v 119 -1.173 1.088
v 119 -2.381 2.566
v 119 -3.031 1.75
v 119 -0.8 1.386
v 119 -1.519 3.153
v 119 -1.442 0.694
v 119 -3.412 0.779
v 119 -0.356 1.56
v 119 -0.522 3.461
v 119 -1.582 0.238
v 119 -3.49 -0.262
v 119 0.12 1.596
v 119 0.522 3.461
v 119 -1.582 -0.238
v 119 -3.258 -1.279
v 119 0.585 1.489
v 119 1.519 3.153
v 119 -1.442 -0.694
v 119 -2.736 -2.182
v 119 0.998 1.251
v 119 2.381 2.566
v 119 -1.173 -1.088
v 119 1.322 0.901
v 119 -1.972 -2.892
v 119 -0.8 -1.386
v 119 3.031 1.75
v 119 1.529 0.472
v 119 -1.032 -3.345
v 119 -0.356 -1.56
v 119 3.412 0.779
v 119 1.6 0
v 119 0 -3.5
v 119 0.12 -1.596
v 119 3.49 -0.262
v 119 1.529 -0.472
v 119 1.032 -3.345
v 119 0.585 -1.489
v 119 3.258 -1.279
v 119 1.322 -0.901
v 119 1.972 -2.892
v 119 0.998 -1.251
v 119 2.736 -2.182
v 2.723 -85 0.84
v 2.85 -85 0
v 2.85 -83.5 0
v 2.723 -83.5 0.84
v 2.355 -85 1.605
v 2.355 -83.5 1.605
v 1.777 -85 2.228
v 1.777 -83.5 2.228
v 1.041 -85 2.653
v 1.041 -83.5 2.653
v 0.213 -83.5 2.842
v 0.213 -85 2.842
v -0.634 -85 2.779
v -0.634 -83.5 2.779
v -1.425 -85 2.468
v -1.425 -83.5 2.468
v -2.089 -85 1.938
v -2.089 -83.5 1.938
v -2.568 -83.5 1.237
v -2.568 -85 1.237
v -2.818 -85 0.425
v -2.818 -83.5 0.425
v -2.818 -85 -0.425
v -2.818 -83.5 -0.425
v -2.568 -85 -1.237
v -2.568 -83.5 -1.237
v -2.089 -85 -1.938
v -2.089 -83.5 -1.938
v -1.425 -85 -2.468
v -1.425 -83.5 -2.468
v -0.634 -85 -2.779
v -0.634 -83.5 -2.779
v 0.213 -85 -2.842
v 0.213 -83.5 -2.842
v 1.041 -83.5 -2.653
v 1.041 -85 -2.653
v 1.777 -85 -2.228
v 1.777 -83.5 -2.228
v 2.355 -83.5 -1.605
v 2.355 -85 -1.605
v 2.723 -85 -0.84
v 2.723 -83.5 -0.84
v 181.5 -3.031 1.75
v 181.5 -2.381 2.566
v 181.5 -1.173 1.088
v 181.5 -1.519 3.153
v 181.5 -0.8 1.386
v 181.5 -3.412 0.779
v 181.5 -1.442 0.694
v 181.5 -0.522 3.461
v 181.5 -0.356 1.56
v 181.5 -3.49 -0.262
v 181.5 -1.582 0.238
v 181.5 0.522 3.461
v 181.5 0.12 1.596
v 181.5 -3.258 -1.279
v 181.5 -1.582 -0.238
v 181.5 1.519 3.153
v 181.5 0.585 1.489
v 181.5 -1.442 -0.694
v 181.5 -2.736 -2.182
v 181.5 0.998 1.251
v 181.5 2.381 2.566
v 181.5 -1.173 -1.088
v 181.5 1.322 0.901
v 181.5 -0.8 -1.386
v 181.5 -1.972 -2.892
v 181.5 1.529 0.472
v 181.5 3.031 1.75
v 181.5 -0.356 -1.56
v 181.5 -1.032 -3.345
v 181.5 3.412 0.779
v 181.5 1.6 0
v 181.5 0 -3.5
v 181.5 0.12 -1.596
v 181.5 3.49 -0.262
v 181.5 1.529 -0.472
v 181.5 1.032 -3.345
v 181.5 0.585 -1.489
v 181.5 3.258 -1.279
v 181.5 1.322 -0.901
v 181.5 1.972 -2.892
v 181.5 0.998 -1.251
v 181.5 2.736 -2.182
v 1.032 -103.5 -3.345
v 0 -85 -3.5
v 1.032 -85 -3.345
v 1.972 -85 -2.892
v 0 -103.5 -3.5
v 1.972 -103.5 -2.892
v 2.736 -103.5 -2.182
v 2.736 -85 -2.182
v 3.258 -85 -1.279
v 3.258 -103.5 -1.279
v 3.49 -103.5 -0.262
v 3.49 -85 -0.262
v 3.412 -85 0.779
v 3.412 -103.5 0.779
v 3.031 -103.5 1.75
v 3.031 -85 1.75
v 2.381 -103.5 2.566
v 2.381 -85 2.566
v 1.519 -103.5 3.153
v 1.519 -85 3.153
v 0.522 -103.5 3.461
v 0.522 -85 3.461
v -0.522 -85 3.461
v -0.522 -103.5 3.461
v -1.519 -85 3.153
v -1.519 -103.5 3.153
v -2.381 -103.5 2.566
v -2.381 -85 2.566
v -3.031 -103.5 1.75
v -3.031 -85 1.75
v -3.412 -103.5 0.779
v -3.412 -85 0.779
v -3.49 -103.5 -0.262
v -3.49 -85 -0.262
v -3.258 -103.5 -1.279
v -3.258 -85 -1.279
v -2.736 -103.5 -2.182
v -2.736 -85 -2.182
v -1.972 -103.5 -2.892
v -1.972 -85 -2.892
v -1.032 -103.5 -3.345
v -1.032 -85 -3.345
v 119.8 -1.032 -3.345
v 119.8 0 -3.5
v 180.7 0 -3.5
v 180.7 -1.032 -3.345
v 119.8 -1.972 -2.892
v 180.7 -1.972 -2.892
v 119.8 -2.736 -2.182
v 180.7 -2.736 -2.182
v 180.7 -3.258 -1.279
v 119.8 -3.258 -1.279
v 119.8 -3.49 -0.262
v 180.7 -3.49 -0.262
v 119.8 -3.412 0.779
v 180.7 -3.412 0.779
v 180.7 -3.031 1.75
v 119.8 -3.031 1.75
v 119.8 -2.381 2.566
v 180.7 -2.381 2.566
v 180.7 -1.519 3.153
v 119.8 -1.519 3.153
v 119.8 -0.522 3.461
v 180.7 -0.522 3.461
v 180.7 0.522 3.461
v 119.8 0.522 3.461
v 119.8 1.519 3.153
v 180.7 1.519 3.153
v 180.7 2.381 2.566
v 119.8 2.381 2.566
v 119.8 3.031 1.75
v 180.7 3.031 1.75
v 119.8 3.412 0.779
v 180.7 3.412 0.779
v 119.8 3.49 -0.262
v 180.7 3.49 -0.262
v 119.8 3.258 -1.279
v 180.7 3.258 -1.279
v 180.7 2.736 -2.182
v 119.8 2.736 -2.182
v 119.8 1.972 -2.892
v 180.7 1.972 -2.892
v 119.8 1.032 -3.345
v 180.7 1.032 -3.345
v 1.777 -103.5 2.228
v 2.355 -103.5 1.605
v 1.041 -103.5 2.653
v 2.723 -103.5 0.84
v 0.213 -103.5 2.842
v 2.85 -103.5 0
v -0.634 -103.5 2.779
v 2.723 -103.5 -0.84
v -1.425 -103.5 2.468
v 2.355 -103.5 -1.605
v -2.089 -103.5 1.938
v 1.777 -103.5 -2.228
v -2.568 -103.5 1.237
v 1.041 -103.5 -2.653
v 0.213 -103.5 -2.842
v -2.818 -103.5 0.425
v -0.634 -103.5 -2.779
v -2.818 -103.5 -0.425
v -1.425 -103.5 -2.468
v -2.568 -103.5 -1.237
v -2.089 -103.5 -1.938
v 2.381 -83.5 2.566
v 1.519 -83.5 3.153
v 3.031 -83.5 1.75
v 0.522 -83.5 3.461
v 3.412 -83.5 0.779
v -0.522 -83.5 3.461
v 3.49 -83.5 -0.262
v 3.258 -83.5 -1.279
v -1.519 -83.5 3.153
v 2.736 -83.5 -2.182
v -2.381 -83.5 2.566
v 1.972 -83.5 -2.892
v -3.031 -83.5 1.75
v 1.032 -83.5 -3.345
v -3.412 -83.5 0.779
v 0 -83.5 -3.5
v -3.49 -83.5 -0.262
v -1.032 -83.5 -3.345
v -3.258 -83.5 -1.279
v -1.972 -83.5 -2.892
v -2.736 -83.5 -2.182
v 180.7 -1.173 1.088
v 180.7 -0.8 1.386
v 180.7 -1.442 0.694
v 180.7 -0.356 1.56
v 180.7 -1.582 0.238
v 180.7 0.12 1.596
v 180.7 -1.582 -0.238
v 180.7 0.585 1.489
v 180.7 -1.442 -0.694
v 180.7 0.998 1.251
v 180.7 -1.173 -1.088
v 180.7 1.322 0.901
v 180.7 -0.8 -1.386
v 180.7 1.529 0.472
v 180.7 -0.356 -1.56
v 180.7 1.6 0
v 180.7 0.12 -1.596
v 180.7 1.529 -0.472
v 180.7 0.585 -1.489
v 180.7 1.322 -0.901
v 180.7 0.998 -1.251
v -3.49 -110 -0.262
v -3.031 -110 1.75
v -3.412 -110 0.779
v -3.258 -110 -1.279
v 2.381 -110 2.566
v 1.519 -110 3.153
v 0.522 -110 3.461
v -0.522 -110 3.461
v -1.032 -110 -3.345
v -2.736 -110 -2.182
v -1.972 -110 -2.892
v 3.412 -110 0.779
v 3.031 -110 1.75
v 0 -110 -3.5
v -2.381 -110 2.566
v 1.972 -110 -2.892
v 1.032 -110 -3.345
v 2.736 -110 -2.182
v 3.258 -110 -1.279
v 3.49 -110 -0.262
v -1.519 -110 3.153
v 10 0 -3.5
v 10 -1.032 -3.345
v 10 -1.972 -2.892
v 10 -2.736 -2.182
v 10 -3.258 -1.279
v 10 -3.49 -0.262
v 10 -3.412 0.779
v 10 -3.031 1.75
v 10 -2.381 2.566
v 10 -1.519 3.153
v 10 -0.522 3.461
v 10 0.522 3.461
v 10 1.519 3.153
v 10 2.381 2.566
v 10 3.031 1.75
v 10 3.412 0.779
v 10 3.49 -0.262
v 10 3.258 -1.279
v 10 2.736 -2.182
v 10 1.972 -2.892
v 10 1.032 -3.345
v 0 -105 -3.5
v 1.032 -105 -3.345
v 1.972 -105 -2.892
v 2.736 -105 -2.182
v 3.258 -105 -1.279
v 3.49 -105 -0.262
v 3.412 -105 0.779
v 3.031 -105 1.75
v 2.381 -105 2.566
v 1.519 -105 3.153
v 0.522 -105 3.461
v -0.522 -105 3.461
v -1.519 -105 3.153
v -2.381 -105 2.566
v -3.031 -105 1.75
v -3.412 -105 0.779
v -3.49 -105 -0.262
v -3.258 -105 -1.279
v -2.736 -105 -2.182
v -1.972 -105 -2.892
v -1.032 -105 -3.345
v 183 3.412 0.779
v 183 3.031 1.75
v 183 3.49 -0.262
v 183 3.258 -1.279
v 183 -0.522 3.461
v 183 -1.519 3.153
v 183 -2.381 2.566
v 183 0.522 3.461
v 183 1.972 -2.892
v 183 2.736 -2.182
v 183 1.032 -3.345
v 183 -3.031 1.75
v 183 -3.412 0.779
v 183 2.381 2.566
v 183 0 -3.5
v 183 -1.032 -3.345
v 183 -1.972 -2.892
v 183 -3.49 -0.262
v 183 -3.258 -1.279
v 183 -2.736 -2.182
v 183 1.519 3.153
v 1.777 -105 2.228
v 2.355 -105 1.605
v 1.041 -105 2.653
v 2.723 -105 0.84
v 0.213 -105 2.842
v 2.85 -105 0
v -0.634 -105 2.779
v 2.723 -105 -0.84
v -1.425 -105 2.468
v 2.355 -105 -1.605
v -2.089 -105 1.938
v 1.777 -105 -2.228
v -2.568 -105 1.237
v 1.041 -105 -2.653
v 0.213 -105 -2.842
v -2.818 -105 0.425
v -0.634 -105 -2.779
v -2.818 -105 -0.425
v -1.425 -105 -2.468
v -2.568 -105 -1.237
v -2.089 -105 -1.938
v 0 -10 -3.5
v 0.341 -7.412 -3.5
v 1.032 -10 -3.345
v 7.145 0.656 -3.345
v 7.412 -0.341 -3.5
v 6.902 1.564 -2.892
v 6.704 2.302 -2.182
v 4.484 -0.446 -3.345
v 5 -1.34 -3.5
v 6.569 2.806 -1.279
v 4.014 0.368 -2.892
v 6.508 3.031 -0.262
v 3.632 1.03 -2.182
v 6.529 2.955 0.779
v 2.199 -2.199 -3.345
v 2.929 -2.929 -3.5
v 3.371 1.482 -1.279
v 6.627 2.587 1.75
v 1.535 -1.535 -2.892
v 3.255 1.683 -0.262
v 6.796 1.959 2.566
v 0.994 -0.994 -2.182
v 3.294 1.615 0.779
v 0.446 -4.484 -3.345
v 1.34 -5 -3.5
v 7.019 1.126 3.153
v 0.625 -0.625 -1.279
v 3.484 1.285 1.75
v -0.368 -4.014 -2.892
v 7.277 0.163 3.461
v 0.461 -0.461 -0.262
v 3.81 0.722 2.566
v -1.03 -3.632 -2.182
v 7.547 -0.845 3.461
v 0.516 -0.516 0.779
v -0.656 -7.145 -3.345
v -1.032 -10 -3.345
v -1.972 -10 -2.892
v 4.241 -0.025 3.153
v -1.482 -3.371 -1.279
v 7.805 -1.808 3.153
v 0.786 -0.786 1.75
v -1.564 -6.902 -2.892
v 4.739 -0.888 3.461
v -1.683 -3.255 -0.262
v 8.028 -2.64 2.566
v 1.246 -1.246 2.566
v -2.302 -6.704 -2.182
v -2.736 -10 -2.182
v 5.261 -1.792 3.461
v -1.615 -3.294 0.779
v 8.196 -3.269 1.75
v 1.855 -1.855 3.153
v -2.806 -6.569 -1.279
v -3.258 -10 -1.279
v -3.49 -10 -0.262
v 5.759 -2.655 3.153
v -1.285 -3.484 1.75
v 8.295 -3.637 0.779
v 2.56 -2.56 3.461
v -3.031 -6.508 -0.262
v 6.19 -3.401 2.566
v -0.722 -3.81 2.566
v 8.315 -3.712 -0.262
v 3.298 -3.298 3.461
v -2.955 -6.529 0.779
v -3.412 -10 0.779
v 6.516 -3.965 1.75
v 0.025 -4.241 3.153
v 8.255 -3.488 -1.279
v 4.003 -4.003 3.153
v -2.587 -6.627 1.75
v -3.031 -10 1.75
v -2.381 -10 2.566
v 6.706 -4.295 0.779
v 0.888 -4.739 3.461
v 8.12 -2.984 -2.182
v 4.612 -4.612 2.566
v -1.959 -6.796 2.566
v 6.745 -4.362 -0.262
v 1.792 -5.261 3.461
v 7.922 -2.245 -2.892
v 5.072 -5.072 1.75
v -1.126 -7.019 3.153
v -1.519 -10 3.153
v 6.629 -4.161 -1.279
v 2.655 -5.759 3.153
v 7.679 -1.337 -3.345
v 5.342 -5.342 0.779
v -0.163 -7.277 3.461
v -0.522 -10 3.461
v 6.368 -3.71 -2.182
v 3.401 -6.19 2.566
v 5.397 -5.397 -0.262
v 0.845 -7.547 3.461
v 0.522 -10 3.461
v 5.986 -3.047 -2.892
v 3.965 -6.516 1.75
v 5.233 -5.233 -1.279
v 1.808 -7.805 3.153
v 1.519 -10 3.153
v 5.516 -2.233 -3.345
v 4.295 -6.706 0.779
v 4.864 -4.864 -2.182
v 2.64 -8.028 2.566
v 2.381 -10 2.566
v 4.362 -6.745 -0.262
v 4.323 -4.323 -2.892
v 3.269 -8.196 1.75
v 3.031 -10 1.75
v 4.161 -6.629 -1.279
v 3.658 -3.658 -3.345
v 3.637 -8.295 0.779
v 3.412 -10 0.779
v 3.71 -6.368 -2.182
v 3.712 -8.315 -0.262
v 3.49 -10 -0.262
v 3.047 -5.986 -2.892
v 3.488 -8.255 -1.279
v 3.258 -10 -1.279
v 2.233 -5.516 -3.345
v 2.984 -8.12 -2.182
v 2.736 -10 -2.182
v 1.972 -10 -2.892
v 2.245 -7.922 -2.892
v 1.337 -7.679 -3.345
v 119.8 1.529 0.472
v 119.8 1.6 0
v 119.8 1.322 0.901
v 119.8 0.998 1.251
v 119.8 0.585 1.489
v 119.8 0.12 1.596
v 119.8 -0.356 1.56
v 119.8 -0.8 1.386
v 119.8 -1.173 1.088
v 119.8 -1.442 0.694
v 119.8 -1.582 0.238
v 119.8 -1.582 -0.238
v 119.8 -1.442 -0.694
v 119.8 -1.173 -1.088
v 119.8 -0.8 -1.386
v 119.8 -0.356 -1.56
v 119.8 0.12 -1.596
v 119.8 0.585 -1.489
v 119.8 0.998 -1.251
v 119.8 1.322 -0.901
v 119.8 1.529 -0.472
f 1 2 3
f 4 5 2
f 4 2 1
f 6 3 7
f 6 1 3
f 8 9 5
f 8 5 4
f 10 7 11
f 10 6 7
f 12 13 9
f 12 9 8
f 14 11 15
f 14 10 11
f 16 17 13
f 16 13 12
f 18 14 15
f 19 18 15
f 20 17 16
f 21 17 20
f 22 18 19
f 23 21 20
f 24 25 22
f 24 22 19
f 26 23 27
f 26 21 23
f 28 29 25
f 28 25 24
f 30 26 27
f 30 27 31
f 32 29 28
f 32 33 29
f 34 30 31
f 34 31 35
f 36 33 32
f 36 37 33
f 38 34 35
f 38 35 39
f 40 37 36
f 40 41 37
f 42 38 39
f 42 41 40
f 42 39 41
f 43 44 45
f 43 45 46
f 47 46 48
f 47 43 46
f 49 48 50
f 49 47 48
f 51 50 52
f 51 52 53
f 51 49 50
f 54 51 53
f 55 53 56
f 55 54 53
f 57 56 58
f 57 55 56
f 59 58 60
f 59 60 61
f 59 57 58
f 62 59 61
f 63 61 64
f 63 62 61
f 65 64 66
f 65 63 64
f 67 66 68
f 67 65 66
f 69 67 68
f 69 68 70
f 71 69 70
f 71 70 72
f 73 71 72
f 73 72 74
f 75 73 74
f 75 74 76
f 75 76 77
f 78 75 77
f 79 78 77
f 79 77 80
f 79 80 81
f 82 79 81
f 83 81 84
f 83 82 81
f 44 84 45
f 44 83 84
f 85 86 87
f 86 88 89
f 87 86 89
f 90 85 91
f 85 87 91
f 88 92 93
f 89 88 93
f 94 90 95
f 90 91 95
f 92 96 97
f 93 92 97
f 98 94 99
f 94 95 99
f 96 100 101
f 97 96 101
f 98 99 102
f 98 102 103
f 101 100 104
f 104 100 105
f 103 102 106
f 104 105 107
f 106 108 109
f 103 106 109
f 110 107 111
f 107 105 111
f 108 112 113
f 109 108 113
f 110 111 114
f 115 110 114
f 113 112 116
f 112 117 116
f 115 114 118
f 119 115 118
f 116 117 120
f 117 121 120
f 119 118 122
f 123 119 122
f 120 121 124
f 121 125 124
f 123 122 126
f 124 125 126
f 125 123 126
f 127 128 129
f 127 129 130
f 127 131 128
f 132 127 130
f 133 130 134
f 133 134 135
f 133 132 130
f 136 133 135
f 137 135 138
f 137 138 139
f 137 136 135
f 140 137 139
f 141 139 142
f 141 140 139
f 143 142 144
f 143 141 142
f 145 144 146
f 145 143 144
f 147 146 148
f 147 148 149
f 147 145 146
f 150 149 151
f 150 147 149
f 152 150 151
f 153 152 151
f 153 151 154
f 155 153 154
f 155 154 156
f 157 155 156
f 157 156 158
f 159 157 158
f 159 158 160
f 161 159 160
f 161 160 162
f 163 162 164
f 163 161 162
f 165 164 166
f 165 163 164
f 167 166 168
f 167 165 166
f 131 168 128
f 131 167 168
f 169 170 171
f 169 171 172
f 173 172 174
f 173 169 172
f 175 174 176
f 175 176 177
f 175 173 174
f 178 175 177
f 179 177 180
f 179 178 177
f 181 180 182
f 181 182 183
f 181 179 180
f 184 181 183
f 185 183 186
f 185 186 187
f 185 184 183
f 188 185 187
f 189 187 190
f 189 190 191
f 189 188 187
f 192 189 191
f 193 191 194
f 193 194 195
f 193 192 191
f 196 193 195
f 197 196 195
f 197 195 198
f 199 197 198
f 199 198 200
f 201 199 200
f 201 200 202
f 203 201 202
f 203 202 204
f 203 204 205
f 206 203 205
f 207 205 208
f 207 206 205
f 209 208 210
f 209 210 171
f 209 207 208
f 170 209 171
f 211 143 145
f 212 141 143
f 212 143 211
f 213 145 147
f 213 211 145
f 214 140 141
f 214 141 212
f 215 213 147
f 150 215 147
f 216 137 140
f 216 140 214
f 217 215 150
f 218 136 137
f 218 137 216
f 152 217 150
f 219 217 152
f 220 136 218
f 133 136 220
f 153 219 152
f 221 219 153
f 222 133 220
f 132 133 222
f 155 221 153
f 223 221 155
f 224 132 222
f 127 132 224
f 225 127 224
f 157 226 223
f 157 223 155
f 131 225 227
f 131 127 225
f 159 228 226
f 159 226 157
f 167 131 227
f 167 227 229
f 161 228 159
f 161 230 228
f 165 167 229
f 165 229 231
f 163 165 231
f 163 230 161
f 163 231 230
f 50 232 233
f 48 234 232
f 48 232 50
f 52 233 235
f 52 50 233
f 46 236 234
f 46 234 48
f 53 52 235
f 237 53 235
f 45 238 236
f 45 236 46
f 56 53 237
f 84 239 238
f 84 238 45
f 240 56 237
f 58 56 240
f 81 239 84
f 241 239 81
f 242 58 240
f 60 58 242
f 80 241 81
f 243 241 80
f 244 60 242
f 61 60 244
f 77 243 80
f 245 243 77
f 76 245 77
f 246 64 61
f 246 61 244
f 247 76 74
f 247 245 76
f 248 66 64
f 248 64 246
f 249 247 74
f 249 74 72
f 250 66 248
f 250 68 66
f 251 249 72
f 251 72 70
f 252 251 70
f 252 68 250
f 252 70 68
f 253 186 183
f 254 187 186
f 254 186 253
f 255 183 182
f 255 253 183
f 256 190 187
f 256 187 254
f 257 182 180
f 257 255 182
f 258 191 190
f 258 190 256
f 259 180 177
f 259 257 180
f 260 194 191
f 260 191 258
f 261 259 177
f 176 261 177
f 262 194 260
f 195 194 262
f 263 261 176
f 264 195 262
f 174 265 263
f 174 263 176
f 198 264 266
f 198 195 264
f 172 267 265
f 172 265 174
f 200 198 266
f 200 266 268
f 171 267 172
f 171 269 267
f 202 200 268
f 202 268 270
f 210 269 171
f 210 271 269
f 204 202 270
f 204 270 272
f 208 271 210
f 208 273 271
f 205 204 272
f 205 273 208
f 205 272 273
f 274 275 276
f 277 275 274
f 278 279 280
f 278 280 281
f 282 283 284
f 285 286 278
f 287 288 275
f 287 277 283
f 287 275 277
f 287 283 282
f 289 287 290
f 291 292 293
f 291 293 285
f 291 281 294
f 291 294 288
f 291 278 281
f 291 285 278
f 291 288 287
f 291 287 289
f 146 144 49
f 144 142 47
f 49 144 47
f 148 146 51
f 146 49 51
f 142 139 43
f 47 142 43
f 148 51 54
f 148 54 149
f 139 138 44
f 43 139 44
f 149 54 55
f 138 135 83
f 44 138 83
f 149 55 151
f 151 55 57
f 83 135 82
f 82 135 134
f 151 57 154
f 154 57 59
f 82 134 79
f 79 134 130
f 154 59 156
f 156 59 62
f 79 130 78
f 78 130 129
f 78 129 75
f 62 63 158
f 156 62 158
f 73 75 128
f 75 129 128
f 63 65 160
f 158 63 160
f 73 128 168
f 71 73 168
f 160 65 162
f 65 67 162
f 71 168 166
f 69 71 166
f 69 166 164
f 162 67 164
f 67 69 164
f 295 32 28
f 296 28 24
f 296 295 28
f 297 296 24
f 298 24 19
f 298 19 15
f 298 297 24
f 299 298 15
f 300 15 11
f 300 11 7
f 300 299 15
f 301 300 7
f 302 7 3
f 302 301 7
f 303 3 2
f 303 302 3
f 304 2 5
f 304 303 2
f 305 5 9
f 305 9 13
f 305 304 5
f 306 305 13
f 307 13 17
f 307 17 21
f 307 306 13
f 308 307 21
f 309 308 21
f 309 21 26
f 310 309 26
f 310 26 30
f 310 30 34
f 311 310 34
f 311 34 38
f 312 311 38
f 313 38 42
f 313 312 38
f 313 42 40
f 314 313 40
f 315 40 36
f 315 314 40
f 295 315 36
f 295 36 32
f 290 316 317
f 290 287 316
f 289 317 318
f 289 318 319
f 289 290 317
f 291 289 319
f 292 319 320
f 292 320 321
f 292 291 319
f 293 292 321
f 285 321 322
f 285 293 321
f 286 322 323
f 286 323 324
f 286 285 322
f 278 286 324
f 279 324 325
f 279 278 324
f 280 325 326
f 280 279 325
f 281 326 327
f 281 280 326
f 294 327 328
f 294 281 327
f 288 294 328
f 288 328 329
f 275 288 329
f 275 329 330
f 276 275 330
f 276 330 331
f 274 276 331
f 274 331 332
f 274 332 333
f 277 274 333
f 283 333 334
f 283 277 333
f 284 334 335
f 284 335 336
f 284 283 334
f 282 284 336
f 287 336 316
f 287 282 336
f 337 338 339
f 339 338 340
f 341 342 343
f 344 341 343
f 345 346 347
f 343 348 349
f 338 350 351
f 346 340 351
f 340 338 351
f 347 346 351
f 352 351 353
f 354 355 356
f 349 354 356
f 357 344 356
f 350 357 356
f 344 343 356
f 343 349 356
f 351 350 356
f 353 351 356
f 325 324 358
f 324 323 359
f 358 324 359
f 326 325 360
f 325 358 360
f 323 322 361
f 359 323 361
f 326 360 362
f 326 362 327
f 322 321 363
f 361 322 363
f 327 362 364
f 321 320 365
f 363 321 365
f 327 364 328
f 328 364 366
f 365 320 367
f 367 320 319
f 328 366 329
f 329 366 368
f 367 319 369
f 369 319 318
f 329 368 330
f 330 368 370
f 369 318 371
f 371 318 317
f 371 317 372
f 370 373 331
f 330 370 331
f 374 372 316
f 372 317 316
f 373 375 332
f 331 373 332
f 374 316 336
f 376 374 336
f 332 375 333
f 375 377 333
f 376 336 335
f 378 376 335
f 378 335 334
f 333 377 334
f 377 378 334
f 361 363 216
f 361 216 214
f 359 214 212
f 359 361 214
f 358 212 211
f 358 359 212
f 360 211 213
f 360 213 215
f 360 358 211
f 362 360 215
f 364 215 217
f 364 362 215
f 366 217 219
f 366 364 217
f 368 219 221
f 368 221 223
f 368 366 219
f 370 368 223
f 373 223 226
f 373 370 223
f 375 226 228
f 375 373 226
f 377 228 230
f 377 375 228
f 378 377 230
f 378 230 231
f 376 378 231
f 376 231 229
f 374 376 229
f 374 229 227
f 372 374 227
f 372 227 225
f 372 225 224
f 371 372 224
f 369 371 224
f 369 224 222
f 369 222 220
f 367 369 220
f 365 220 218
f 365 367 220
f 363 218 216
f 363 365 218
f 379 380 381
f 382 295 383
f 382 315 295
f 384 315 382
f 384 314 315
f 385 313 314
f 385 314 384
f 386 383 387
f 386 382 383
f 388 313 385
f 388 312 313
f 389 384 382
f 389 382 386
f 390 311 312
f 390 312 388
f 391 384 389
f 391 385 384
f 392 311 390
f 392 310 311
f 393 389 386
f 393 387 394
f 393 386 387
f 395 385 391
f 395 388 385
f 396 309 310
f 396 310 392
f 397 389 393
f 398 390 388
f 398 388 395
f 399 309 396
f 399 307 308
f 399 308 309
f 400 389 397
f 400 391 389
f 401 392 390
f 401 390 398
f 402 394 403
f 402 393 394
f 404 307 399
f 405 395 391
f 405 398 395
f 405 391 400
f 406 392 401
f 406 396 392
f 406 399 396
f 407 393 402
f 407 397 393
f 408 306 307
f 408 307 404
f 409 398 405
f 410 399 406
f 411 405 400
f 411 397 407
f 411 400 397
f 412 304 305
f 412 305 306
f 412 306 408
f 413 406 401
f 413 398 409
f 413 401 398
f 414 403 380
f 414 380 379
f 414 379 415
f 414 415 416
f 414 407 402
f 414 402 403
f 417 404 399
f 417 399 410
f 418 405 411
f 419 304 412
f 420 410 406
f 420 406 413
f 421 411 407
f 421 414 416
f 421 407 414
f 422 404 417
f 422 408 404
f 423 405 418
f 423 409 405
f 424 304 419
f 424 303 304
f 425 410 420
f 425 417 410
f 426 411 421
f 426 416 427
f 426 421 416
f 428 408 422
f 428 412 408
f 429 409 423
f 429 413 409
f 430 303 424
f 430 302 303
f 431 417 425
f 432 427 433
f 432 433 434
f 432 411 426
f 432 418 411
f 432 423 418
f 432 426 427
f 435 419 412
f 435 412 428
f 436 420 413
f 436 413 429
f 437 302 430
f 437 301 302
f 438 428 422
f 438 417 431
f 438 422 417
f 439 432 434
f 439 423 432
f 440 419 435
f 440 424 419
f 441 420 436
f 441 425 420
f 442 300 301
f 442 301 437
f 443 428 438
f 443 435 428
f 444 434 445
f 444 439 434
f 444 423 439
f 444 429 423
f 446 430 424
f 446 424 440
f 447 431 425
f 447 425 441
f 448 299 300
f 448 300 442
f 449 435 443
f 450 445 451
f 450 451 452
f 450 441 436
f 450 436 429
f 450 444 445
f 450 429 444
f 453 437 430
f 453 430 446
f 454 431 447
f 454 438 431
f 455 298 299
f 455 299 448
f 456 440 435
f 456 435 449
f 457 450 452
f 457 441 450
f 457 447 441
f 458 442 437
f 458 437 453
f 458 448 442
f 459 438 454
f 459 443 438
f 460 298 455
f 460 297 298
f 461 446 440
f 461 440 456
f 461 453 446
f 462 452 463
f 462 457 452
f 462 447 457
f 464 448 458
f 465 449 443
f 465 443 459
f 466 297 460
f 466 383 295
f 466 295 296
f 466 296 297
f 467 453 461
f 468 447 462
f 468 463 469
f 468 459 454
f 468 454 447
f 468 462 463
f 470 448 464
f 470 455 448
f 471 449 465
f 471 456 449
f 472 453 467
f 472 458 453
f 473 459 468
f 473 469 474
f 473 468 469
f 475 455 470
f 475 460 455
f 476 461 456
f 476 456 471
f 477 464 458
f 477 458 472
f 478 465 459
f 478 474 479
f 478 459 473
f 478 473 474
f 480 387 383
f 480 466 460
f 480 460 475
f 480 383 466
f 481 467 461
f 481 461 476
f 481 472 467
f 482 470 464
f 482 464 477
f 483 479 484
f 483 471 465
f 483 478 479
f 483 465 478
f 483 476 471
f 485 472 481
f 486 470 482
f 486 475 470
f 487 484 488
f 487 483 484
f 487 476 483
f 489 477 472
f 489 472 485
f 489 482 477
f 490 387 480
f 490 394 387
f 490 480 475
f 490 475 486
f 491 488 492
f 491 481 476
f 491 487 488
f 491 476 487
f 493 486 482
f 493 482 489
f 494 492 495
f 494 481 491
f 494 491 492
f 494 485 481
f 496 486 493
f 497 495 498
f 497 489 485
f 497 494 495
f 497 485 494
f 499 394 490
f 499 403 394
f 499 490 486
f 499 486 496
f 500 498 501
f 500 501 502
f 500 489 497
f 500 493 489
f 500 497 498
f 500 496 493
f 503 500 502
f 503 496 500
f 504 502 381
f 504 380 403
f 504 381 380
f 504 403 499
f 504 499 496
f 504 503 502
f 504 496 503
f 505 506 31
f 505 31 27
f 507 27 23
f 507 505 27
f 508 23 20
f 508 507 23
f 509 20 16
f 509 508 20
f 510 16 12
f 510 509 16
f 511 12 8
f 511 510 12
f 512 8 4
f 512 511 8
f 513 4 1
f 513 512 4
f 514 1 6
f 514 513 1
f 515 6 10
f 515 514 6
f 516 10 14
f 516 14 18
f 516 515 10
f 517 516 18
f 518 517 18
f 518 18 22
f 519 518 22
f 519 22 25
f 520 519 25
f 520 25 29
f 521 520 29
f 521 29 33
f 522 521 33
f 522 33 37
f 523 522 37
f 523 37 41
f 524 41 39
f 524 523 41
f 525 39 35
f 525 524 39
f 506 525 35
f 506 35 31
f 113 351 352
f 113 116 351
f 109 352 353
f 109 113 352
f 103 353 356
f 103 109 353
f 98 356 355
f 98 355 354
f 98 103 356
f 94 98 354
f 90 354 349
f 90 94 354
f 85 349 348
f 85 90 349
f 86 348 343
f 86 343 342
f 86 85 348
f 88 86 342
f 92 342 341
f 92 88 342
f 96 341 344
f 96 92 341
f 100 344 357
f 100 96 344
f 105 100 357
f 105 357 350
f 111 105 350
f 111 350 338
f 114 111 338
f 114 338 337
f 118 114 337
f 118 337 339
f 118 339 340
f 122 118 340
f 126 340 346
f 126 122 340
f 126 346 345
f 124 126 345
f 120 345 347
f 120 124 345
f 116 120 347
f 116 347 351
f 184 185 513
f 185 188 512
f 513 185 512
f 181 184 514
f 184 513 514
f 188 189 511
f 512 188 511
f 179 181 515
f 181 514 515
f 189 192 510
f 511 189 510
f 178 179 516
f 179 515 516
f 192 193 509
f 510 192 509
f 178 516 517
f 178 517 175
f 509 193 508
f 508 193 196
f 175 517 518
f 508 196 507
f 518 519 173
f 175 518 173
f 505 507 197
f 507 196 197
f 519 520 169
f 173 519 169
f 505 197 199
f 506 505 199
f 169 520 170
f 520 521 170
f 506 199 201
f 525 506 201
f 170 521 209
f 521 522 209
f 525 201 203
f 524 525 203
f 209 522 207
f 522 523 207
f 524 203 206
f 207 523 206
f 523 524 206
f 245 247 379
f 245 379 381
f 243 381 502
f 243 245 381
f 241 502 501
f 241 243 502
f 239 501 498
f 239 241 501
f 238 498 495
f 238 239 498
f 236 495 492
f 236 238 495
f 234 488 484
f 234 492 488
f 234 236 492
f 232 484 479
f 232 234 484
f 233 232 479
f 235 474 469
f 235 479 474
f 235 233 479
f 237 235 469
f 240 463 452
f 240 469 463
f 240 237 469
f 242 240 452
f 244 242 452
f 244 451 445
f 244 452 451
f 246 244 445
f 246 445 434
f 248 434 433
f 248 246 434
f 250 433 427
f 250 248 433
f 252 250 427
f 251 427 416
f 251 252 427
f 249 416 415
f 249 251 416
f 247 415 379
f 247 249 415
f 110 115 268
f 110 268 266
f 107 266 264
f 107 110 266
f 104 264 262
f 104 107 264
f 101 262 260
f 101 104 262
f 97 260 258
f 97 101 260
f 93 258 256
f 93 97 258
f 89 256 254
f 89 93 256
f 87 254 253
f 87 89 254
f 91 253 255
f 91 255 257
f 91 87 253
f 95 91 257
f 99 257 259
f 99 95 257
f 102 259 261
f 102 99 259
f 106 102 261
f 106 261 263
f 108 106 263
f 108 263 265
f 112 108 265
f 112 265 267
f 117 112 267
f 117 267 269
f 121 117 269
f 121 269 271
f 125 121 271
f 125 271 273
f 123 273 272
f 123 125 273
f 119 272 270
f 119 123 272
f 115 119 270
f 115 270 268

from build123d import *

# Parameters (mm, degrees)
WYCI_GNI_CIE_PO_CIE_CE1_PROFILE_R = 3.5
SZKIC26_R                         = 4
SZKIC26_R_2                       = 2.85
WYTNIJ_WYCI_GNI_CIE1_DEPTH        = 1.5
SZKIC36_R                         = 4
SZKIC36_R_2                       = 2.85
WYTNIJ_WYCI_GNI_CIE3_DEPTH        = 1.5
SZKIC46_R                         = 4
SZKIC46_R_2                       = 1.6
WYTNIJ_WYCI_GNI_CIE4_DEPTH        = 0.8
WYTNIJ_WYCI_GNI_CIE5_START        = 0.8
SZKIC53_R                         = 4
SZKIC53_R_2                       = 1.6
WYTNIJ_WYCI_GNI_CIE5_DEPTH        = 0.8


with BuildPart() as part:
    # Wyciągnięcie po ścieżce1: sweep along a path in Szkic1
    with BuildLine(Plane.XY) as wyci_gni_cie_po_cie_ce1_path:
        Line((183, 0), (10, 0))
        ThreePointArc((10, 0), (2.928932188, -2.928932188), (0, -10))
        Line((0, -10), (0, -110))
    # Wyciągnięcie po ścieżce1 profile (on start of the path) → Wyciągnięcie po ścieżce1 (sweep)
    with BuildSketch(Plane(origin=(183, 0, 0), x_dir=(0, 0, -1), z_dir=(-1, 0, 0))):
        Circle(WYCI_GNI_CIE_PO_CIE_CE1_PROFILE_R)
    sweep(path=wyci_gni_cie_po_cie_ce1_path.line)

    # Szkic26 → Wytnij-wyciągnięcie1 (cut)
    with BuildSketch(Plane(origin=(0, -105, 0), x_dir=(-1, 0, 0), z_dir=(0, -1, 0))):
        Circle(SZKIC26_R)
        with Locations(Location((0, 0, 0), (0, 0, 180))):
            Circle(SZKIC26_R_2, mode=Mode.SUBTRACT)
    extrude(amount=-WYTNIJ_WYCI_GNI_CIE1_DEPTH, mode=Mode.SUBTRACT)

    # Szkic36 → Wytnij-wyciągnięcie3 (cut)
    with BuildSketch(Plane(origin=(0, -85, 0), x_dir=(-1, 0, 0), z_dir=(0, -1, 0))):
        Circle(SZKIC36_R)
        with Locations(Location((0, 0, 0), (0, 0, 180))):
            Circle(SZKIC36_R_2, mode=Mode.SUBTRACT)
    extrude(amount=-WYTNIJ_WYCI_GNI_CIE3_DEPTH, mode=Mode.SUBTRACT)

    # Szkic46 → Wytnij-wyciągnięcie4 (cut)
    with BuildSketch(Plane(origin=(181.5, 0, 0), x_dir=(0, 0, -1), z_dir=(1, 0, 0))):
        Circle(SZKIC46_R)
        with Locations(Location((0, 0, 0), (0, 0, 90))):
            Circle(SZKIC46_R_2, mode=Mode.SUBTRACT)
    extrude(amount=-WYTNIJ_WYCI_GNI_CIE4_DEPTH, mode=Mode.SUBTRACT)

    # Szkic53 → Wytnij-wyciągnięcie5 (cut)
    with BuildSketch(Plane(origin=(119, 0, 0), x_dir=(0, 0, -1), z_dir=(1, 0, 0)).offset(WYTNIJ_WYCI_GNI_CIE5_START)):
        Circle(SZKIC53_R)
        with Locations(Location((0, 0, 0), (0, 0, 90))):
            Circle(SZKIC53_R_2, mode=Mode.SUBTRACT)
    extrude(amount=-WYTNIJ_WYCI_GNI_CIE5_DEPTH, mode=Mode.SUBTRACT)


solid = part.part
